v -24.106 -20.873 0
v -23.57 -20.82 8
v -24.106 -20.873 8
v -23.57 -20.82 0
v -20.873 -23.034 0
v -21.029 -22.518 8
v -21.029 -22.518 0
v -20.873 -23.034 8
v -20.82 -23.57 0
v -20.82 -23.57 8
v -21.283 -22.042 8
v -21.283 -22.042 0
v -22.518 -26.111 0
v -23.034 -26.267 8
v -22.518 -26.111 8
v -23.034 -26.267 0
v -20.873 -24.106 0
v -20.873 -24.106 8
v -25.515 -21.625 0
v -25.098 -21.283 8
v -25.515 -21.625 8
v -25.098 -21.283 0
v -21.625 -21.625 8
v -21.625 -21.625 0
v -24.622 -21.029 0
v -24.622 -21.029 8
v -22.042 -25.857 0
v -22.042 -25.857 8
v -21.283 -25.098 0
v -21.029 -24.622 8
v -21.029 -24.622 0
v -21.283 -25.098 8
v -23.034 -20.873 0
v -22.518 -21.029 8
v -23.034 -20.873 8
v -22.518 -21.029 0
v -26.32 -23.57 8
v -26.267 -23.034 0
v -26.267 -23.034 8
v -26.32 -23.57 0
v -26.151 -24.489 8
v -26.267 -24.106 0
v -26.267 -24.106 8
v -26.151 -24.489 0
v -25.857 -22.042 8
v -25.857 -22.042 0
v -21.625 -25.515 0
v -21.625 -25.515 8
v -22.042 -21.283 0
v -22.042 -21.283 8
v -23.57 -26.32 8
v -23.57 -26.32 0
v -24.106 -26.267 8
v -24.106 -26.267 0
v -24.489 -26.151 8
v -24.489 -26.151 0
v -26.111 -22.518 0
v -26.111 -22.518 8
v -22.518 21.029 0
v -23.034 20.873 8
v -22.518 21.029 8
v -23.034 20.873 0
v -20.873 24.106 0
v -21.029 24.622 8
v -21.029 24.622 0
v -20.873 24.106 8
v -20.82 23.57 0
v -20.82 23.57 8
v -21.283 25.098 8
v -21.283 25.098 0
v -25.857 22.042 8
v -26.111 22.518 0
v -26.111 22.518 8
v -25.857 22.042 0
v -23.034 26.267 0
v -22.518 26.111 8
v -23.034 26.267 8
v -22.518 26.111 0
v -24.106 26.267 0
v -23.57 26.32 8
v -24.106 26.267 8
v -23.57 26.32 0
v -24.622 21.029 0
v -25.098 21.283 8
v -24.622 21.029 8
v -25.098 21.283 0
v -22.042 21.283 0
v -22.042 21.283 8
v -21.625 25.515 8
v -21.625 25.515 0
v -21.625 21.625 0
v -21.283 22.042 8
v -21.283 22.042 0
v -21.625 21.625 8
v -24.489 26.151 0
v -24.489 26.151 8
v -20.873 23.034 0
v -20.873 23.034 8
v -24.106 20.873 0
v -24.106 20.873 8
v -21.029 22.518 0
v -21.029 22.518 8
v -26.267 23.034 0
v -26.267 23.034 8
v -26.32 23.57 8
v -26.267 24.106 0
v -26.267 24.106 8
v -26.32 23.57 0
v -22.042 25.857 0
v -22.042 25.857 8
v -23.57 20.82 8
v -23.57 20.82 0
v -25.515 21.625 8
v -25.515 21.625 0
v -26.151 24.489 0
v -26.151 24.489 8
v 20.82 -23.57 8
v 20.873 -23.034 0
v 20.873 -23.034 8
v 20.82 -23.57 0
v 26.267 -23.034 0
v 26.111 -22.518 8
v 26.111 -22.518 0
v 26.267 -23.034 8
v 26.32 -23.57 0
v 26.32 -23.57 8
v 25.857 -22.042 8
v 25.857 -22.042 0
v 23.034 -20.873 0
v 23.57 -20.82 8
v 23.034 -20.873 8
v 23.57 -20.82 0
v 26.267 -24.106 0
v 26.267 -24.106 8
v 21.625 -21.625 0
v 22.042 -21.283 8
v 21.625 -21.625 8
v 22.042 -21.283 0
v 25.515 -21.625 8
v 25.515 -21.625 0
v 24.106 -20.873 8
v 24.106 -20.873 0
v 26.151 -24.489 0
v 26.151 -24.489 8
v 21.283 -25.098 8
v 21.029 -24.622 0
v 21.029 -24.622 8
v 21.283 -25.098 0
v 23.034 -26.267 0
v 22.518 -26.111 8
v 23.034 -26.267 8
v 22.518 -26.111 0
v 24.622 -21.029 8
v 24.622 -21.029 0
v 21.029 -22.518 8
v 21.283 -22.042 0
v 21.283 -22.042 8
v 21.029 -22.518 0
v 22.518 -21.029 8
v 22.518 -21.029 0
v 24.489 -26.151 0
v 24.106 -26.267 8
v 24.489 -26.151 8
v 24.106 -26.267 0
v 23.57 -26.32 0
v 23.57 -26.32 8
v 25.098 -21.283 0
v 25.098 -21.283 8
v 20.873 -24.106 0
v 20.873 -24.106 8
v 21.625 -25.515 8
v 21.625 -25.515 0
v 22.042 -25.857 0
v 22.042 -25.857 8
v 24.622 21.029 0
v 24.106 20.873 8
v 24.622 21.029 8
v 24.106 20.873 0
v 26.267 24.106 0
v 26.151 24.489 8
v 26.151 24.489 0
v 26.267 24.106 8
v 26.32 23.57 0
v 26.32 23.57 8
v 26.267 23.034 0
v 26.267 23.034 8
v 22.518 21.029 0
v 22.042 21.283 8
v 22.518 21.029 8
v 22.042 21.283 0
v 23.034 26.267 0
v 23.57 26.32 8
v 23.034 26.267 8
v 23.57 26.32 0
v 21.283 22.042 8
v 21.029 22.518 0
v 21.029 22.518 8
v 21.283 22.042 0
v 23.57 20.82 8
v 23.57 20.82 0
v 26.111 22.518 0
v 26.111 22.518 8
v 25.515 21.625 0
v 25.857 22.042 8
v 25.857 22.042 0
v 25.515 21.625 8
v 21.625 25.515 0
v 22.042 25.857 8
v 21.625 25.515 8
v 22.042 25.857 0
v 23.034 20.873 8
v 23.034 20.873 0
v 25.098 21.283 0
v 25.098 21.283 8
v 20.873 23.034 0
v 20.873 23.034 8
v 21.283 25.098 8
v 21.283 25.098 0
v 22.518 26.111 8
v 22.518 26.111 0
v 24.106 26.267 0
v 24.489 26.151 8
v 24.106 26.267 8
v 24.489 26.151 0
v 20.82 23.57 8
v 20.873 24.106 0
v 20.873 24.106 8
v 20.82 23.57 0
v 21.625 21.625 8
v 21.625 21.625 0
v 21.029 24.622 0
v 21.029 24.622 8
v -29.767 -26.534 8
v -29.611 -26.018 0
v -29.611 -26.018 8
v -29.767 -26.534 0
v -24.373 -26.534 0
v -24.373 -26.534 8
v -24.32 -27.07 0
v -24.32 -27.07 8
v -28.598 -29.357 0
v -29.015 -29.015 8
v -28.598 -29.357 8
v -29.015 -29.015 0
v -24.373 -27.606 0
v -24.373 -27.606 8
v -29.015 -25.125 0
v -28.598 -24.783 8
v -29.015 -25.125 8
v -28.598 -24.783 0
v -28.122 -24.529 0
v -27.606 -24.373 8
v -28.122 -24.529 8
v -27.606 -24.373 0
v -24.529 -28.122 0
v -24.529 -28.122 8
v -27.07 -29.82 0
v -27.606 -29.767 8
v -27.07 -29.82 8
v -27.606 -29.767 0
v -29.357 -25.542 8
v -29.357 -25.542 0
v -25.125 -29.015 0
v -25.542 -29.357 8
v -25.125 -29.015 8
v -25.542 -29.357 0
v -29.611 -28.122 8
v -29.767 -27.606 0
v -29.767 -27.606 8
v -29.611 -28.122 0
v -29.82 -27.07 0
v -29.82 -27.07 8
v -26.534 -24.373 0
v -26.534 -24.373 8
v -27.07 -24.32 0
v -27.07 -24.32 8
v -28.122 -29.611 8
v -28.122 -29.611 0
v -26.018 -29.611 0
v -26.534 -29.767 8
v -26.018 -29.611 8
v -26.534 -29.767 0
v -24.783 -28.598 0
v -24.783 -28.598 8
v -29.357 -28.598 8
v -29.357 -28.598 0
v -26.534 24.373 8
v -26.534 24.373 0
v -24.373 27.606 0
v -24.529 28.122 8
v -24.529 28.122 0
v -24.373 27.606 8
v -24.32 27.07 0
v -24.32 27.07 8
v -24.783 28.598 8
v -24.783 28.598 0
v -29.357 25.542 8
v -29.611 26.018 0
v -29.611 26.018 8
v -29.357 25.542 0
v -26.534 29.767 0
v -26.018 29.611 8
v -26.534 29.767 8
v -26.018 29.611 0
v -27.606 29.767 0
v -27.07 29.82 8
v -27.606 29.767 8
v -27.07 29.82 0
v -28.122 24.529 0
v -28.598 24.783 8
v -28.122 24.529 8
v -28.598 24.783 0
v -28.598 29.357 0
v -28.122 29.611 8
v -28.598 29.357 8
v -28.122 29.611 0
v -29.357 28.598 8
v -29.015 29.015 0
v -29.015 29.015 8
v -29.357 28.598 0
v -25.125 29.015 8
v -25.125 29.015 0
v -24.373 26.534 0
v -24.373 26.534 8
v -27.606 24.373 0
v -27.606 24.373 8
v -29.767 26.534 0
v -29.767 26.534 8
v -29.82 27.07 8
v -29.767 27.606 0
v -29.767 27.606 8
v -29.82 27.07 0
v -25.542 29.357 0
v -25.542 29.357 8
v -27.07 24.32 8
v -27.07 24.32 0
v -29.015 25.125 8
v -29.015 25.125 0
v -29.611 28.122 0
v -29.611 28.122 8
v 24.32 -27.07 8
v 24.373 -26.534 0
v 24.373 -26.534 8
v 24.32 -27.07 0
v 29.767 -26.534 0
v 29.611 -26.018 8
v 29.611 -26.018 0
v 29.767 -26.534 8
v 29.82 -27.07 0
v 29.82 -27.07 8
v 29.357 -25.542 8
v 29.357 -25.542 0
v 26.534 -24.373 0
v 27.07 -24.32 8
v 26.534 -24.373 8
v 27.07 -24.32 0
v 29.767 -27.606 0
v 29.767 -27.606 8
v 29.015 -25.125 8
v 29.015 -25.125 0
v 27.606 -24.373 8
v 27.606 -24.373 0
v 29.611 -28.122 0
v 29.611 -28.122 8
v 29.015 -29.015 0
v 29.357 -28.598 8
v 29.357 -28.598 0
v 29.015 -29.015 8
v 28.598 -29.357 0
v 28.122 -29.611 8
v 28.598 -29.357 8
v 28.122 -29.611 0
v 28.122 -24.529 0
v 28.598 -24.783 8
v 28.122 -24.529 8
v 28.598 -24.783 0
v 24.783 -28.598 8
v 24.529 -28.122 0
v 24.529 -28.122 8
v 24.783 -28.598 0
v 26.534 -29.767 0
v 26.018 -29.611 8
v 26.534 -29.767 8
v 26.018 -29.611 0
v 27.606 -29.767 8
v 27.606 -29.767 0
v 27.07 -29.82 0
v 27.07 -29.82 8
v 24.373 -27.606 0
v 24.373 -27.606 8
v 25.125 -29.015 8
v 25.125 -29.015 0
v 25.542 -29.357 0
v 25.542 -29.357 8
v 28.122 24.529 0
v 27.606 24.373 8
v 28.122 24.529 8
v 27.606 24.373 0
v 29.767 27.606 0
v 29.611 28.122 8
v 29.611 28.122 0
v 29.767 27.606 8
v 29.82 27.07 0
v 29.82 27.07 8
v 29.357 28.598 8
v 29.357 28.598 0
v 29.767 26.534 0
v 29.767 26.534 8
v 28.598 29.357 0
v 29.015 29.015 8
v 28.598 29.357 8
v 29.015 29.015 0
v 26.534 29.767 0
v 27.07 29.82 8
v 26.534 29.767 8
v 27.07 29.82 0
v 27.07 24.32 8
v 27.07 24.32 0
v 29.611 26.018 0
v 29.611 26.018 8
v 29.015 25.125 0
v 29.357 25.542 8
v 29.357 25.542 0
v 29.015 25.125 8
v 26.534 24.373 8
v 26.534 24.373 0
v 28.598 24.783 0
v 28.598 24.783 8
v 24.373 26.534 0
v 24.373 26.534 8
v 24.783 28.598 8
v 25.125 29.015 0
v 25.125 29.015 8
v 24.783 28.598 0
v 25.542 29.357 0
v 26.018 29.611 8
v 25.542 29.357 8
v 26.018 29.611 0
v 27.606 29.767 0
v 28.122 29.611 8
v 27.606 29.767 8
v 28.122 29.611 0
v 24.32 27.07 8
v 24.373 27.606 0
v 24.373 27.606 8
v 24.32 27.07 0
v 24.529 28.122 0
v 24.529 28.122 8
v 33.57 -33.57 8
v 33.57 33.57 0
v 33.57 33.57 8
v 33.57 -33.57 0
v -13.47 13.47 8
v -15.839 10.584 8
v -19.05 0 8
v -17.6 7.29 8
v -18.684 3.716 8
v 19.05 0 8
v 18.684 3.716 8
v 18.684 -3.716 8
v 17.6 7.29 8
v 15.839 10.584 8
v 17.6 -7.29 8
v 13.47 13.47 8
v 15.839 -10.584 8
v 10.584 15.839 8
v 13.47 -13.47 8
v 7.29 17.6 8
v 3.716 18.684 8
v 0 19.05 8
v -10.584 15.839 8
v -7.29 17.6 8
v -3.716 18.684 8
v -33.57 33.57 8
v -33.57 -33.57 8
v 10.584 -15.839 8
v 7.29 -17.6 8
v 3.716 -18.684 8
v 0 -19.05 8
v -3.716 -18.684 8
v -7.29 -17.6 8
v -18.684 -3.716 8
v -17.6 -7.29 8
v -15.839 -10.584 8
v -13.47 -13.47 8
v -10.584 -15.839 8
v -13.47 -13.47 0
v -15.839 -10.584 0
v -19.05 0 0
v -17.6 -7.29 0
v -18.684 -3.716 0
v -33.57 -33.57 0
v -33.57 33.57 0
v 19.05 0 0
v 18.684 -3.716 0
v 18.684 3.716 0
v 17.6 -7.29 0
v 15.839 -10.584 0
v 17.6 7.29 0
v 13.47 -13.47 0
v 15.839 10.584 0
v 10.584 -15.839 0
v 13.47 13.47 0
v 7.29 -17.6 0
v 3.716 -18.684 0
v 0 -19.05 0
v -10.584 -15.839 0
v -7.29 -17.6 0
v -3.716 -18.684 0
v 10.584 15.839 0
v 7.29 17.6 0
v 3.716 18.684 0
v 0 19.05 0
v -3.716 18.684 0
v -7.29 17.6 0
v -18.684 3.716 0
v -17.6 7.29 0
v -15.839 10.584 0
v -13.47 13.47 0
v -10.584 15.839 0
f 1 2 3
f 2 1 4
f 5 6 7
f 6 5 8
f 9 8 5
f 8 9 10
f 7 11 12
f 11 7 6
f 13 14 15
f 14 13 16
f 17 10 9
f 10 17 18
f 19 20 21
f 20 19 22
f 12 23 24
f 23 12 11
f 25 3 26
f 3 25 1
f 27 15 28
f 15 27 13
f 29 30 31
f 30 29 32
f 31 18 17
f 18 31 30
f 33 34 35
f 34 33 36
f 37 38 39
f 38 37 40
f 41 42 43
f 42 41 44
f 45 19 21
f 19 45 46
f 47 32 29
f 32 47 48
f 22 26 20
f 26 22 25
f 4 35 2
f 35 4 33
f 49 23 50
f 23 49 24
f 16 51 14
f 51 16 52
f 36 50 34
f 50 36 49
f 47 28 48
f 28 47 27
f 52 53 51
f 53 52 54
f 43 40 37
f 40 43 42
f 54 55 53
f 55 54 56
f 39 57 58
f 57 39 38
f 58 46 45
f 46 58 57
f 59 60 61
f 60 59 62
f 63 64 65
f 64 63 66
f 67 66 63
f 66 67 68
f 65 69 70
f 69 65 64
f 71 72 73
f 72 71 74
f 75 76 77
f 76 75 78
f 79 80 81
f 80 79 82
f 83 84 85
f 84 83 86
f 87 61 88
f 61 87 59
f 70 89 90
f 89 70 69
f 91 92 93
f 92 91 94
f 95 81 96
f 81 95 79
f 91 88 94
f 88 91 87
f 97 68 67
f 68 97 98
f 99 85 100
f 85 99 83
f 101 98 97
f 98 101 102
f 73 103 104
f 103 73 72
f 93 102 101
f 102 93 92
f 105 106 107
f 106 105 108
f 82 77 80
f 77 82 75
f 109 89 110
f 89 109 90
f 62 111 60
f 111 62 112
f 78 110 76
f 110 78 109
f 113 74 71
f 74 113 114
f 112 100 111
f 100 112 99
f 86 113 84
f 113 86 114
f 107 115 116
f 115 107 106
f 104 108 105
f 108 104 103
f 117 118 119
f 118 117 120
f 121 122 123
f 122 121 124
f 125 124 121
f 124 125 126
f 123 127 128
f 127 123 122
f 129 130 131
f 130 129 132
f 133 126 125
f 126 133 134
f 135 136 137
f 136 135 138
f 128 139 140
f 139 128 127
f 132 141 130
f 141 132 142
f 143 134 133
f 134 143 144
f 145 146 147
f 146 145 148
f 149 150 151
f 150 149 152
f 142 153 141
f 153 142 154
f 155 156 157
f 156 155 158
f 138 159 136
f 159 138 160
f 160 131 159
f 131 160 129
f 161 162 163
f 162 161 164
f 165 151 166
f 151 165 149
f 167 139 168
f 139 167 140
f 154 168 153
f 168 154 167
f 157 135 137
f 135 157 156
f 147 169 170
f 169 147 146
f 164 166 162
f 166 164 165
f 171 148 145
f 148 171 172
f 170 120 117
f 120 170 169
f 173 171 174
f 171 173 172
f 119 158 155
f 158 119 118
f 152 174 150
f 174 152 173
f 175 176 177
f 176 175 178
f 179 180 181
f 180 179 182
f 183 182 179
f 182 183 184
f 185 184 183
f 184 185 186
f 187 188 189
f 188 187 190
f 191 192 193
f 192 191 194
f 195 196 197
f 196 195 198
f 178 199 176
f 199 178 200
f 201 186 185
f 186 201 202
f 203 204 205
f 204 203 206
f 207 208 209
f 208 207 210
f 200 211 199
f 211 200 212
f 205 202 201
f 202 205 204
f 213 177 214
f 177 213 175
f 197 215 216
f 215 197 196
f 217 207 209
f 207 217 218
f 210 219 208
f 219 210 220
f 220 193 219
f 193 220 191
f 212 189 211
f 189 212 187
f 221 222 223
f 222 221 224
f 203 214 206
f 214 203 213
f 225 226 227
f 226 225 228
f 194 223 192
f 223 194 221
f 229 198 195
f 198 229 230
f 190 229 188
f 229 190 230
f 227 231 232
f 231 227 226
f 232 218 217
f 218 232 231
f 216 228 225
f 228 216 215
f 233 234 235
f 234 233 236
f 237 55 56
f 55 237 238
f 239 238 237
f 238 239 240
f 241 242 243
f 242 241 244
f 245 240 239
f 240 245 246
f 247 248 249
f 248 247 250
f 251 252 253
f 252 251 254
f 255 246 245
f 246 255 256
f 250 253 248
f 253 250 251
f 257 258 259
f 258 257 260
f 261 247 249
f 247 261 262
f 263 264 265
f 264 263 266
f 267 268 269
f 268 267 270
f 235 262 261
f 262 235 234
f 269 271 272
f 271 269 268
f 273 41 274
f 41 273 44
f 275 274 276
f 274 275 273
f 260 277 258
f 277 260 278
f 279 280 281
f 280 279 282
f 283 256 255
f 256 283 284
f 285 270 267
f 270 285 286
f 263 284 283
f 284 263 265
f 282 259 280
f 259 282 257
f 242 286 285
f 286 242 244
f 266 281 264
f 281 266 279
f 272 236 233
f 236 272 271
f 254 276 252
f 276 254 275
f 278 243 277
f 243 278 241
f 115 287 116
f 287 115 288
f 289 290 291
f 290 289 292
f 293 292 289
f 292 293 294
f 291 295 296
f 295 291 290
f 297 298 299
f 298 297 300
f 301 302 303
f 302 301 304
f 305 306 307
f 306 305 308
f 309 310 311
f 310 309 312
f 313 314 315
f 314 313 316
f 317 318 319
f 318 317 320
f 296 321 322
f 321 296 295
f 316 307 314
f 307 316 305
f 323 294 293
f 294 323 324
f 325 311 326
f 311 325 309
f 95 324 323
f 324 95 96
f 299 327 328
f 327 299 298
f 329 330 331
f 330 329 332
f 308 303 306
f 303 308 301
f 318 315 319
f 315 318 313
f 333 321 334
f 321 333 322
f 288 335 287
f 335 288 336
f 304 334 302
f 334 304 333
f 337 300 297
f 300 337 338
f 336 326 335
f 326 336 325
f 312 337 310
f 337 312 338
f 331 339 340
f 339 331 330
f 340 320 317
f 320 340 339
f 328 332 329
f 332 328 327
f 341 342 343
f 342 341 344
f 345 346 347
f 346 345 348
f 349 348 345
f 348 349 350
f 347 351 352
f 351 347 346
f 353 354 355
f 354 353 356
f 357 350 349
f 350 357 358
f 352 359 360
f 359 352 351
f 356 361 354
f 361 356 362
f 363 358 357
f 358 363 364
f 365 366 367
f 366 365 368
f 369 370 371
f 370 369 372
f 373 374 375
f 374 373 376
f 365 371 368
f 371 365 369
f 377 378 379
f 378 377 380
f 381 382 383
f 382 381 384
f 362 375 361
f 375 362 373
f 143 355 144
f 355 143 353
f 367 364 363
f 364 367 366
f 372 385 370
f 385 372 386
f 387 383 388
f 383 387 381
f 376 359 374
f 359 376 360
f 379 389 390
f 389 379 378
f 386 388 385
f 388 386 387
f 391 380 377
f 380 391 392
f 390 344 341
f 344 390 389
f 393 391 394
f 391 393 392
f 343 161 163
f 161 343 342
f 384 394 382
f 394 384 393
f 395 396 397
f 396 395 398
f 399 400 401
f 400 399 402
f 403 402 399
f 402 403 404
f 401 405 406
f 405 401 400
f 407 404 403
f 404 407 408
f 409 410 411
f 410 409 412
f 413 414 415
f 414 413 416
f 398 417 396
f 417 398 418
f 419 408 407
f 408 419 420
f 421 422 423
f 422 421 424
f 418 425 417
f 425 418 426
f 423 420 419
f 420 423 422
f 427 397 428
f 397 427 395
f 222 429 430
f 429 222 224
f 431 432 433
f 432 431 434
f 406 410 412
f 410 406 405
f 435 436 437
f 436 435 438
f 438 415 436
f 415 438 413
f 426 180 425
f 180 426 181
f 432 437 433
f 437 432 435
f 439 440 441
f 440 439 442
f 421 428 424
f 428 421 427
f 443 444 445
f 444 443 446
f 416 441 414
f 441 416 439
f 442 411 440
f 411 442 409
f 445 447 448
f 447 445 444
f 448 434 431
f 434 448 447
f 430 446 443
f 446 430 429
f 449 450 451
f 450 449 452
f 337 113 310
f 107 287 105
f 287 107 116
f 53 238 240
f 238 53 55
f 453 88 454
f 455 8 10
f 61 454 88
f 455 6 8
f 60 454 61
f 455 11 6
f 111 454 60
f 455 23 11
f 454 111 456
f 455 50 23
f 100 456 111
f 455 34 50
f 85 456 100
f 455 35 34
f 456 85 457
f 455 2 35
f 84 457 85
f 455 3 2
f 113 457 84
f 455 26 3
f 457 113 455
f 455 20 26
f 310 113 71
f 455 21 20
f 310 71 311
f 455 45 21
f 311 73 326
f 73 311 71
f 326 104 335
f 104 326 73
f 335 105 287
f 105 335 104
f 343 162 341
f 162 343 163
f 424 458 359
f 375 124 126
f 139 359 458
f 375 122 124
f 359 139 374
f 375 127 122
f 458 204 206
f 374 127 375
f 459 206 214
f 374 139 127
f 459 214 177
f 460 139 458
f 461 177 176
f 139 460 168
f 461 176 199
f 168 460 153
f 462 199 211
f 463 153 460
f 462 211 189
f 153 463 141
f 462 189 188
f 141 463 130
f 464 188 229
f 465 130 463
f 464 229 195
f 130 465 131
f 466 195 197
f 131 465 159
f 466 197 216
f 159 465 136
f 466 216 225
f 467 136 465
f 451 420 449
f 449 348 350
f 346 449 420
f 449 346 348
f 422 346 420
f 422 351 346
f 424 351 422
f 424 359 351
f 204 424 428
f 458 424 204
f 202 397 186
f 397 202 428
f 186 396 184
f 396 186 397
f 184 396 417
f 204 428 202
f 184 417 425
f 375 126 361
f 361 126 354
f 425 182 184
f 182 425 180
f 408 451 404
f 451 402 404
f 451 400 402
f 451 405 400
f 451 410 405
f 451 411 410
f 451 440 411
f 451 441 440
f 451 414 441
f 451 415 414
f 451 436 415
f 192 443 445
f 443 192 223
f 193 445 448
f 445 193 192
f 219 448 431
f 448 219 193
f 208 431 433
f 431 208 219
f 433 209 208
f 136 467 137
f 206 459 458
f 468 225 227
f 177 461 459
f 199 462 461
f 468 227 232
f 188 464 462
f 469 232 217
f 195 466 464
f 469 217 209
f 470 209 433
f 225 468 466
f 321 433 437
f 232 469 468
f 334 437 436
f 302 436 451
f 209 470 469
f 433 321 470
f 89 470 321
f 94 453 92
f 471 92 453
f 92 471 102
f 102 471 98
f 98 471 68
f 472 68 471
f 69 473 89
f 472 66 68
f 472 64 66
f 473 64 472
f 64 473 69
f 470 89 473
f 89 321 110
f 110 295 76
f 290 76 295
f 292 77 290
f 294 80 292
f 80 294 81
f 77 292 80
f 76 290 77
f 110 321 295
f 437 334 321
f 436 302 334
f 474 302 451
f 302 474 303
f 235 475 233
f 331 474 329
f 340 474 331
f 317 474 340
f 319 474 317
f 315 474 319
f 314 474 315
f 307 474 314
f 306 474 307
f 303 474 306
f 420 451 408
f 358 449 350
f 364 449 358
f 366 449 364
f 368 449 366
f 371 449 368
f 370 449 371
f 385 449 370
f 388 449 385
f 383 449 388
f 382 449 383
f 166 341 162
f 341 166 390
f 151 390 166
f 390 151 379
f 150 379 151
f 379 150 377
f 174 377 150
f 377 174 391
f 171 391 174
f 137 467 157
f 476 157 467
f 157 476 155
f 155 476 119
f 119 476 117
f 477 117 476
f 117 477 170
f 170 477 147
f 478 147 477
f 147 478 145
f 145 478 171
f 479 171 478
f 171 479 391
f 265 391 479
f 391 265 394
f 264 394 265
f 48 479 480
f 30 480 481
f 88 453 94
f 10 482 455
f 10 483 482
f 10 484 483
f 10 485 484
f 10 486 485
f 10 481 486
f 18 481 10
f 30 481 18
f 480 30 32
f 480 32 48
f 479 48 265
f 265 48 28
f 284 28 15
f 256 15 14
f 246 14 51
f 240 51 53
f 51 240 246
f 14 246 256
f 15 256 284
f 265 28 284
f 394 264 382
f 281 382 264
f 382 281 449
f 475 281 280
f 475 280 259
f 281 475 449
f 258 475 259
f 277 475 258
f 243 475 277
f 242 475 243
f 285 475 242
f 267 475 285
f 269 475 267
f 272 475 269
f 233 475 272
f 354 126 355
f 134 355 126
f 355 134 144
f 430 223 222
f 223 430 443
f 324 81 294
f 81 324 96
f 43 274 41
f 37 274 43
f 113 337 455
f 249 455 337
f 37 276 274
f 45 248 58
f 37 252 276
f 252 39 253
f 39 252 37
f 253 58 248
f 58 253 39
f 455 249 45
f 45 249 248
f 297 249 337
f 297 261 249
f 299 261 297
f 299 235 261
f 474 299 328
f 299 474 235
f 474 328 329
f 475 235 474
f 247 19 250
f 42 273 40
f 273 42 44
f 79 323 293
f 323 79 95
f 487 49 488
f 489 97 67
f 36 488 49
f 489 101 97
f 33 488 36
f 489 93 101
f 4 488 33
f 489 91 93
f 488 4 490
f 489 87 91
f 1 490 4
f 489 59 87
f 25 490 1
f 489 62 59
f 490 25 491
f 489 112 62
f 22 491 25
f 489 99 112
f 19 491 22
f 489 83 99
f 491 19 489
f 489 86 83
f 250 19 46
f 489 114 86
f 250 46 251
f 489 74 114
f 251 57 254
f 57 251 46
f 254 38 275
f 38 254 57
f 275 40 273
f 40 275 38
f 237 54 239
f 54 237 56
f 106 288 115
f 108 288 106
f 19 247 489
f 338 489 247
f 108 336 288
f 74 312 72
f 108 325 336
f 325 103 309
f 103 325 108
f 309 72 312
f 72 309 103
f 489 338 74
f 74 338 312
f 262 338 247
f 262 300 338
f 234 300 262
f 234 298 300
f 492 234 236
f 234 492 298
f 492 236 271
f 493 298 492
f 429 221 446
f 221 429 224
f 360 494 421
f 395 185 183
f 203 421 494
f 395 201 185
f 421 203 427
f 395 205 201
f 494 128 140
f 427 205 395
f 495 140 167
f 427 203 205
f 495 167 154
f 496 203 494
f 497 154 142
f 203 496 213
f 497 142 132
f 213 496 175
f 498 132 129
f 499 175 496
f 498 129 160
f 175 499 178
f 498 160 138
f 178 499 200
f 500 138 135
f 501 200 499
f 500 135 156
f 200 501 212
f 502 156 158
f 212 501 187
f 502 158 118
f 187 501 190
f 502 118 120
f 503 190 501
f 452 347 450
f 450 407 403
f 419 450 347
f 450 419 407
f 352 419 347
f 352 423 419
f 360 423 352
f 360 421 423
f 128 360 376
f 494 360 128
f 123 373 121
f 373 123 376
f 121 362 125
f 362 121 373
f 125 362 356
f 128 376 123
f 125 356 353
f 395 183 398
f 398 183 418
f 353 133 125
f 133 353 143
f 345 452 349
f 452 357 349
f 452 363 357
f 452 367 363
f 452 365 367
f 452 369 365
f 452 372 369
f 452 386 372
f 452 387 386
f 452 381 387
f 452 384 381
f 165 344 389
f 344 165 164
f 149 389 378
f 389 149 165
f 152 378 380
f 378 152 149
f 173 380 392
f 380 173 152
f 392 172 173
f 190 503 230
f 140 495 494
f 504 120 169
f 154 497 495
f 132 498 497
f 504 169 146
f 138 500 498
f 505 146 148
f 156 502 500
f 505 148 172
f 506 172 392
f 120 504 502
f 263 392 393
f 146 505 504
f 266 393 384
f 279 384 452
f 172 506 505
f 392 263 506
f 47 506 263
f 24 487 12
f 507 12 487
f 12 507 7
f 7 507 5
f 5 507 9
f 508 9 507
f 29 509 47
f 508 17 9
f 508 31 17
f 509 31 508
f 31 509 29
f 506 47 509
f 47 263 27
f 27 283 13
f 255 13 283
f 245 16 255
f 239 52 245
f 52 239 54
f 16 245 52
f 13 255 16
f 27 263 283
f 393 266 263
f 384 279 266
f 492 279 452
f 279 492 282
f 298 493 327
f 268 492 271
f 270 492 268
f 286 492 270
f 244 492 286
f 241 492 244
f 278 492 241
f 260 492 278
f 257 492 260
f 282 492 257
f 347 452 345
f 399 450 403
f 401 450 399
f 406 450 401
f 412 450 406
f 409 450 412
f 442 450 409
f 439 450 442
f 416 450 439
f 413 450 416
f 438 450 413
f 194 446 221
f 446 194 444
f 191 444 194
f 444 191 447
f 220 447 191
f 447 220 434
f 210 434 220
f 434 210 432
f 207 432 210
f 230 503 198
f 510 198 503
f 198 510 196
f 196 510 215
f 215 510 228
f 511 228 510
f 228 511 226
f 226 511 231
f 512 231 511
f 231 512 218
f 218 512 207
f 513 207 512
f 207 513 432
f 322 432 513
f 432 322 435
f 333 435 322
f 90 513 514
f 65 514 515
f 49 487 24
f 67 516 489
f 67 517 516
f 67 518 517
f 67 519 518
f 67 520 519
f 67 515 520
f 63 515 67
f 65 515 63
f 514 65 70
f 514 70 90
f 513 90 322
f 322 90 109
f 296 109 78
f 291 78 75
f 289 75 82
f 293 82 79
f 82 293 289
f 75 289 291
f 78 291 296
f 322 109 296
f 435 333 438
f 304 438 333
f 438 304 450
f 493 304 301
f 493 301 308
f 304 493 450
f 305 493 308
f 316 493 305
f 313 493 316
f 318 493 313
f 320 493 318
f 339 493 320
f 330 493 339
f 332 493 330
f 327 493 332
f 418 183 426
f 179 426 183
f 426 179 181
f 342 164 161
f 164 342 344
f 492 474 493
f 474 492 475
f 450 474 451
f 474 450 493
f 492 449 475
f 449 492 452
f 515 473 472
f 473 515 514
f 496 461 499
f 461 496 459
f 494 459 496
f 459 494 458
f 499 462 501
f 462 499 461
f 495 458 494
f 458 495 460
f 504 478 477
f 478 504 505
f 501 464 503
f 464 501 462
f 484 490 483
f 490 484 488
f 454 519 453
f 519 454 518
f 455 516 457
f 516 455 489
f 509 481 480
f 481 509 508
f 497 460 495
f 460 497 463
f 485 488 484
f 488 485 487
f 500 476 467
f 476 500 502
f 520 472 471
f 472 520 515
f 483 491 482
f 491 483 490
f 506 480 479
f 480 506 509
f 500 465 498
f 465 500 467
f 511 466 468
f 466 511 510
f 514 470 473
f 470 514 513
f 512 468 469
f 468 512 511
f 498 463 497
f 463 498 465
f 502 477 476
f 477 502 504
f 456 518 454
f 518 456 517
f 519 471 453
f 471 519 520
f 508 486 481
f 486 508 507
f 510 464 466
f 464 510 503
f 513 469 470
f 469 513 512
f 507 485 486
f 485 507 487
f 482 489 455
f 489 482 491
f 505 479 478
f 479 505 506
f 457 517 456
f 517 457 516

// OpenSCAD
$fn = 32;

// ----------------------------------------------------------------------
// Motor mount plate: NEMA23, 67.14 x 67.14 x 8 mm
// ----------------------------------------------------------------------

// --- parameters (mm) ---
plate_w = 67.14;          // plate length, X
plate_d = 67.14;          // plate width, Y
plate_t = 8;              // plate thickness
pattern = 47.14;          // NEMA23 bolt spacing
motor_d = 5.5;            // NEMA23 screw clearance
pilot_d = 38.1;           // pilot boss bore
second_d = 5.5;           // second fastener hole

module plate() {
  translate([-plate_w / 2, -plate_d / 2, 0]) cube([plate_w, plate_d, plate_t]);
}

module motor_holes() {
  for (sx = [-1, 1]) for (sy = [-1, 1])
    translate([sx * pattern / 2, sy * pattern / 2, -1])
      cylinder(h = plate_t + 2, d = motor_d);
}

difference() {
  union() {
    plate();
  }
  motor_holes();
  translate([0, 0, -1]) cylinder(h = plate_t + 2, d = pilot_d);
  for (sx = [-1, 1]) for (sy = [-1, 1])
    translate([sx * 27.07, sy * 27.07, -1]) cylinder(h = plate_t + 2, d = second_d);
}
